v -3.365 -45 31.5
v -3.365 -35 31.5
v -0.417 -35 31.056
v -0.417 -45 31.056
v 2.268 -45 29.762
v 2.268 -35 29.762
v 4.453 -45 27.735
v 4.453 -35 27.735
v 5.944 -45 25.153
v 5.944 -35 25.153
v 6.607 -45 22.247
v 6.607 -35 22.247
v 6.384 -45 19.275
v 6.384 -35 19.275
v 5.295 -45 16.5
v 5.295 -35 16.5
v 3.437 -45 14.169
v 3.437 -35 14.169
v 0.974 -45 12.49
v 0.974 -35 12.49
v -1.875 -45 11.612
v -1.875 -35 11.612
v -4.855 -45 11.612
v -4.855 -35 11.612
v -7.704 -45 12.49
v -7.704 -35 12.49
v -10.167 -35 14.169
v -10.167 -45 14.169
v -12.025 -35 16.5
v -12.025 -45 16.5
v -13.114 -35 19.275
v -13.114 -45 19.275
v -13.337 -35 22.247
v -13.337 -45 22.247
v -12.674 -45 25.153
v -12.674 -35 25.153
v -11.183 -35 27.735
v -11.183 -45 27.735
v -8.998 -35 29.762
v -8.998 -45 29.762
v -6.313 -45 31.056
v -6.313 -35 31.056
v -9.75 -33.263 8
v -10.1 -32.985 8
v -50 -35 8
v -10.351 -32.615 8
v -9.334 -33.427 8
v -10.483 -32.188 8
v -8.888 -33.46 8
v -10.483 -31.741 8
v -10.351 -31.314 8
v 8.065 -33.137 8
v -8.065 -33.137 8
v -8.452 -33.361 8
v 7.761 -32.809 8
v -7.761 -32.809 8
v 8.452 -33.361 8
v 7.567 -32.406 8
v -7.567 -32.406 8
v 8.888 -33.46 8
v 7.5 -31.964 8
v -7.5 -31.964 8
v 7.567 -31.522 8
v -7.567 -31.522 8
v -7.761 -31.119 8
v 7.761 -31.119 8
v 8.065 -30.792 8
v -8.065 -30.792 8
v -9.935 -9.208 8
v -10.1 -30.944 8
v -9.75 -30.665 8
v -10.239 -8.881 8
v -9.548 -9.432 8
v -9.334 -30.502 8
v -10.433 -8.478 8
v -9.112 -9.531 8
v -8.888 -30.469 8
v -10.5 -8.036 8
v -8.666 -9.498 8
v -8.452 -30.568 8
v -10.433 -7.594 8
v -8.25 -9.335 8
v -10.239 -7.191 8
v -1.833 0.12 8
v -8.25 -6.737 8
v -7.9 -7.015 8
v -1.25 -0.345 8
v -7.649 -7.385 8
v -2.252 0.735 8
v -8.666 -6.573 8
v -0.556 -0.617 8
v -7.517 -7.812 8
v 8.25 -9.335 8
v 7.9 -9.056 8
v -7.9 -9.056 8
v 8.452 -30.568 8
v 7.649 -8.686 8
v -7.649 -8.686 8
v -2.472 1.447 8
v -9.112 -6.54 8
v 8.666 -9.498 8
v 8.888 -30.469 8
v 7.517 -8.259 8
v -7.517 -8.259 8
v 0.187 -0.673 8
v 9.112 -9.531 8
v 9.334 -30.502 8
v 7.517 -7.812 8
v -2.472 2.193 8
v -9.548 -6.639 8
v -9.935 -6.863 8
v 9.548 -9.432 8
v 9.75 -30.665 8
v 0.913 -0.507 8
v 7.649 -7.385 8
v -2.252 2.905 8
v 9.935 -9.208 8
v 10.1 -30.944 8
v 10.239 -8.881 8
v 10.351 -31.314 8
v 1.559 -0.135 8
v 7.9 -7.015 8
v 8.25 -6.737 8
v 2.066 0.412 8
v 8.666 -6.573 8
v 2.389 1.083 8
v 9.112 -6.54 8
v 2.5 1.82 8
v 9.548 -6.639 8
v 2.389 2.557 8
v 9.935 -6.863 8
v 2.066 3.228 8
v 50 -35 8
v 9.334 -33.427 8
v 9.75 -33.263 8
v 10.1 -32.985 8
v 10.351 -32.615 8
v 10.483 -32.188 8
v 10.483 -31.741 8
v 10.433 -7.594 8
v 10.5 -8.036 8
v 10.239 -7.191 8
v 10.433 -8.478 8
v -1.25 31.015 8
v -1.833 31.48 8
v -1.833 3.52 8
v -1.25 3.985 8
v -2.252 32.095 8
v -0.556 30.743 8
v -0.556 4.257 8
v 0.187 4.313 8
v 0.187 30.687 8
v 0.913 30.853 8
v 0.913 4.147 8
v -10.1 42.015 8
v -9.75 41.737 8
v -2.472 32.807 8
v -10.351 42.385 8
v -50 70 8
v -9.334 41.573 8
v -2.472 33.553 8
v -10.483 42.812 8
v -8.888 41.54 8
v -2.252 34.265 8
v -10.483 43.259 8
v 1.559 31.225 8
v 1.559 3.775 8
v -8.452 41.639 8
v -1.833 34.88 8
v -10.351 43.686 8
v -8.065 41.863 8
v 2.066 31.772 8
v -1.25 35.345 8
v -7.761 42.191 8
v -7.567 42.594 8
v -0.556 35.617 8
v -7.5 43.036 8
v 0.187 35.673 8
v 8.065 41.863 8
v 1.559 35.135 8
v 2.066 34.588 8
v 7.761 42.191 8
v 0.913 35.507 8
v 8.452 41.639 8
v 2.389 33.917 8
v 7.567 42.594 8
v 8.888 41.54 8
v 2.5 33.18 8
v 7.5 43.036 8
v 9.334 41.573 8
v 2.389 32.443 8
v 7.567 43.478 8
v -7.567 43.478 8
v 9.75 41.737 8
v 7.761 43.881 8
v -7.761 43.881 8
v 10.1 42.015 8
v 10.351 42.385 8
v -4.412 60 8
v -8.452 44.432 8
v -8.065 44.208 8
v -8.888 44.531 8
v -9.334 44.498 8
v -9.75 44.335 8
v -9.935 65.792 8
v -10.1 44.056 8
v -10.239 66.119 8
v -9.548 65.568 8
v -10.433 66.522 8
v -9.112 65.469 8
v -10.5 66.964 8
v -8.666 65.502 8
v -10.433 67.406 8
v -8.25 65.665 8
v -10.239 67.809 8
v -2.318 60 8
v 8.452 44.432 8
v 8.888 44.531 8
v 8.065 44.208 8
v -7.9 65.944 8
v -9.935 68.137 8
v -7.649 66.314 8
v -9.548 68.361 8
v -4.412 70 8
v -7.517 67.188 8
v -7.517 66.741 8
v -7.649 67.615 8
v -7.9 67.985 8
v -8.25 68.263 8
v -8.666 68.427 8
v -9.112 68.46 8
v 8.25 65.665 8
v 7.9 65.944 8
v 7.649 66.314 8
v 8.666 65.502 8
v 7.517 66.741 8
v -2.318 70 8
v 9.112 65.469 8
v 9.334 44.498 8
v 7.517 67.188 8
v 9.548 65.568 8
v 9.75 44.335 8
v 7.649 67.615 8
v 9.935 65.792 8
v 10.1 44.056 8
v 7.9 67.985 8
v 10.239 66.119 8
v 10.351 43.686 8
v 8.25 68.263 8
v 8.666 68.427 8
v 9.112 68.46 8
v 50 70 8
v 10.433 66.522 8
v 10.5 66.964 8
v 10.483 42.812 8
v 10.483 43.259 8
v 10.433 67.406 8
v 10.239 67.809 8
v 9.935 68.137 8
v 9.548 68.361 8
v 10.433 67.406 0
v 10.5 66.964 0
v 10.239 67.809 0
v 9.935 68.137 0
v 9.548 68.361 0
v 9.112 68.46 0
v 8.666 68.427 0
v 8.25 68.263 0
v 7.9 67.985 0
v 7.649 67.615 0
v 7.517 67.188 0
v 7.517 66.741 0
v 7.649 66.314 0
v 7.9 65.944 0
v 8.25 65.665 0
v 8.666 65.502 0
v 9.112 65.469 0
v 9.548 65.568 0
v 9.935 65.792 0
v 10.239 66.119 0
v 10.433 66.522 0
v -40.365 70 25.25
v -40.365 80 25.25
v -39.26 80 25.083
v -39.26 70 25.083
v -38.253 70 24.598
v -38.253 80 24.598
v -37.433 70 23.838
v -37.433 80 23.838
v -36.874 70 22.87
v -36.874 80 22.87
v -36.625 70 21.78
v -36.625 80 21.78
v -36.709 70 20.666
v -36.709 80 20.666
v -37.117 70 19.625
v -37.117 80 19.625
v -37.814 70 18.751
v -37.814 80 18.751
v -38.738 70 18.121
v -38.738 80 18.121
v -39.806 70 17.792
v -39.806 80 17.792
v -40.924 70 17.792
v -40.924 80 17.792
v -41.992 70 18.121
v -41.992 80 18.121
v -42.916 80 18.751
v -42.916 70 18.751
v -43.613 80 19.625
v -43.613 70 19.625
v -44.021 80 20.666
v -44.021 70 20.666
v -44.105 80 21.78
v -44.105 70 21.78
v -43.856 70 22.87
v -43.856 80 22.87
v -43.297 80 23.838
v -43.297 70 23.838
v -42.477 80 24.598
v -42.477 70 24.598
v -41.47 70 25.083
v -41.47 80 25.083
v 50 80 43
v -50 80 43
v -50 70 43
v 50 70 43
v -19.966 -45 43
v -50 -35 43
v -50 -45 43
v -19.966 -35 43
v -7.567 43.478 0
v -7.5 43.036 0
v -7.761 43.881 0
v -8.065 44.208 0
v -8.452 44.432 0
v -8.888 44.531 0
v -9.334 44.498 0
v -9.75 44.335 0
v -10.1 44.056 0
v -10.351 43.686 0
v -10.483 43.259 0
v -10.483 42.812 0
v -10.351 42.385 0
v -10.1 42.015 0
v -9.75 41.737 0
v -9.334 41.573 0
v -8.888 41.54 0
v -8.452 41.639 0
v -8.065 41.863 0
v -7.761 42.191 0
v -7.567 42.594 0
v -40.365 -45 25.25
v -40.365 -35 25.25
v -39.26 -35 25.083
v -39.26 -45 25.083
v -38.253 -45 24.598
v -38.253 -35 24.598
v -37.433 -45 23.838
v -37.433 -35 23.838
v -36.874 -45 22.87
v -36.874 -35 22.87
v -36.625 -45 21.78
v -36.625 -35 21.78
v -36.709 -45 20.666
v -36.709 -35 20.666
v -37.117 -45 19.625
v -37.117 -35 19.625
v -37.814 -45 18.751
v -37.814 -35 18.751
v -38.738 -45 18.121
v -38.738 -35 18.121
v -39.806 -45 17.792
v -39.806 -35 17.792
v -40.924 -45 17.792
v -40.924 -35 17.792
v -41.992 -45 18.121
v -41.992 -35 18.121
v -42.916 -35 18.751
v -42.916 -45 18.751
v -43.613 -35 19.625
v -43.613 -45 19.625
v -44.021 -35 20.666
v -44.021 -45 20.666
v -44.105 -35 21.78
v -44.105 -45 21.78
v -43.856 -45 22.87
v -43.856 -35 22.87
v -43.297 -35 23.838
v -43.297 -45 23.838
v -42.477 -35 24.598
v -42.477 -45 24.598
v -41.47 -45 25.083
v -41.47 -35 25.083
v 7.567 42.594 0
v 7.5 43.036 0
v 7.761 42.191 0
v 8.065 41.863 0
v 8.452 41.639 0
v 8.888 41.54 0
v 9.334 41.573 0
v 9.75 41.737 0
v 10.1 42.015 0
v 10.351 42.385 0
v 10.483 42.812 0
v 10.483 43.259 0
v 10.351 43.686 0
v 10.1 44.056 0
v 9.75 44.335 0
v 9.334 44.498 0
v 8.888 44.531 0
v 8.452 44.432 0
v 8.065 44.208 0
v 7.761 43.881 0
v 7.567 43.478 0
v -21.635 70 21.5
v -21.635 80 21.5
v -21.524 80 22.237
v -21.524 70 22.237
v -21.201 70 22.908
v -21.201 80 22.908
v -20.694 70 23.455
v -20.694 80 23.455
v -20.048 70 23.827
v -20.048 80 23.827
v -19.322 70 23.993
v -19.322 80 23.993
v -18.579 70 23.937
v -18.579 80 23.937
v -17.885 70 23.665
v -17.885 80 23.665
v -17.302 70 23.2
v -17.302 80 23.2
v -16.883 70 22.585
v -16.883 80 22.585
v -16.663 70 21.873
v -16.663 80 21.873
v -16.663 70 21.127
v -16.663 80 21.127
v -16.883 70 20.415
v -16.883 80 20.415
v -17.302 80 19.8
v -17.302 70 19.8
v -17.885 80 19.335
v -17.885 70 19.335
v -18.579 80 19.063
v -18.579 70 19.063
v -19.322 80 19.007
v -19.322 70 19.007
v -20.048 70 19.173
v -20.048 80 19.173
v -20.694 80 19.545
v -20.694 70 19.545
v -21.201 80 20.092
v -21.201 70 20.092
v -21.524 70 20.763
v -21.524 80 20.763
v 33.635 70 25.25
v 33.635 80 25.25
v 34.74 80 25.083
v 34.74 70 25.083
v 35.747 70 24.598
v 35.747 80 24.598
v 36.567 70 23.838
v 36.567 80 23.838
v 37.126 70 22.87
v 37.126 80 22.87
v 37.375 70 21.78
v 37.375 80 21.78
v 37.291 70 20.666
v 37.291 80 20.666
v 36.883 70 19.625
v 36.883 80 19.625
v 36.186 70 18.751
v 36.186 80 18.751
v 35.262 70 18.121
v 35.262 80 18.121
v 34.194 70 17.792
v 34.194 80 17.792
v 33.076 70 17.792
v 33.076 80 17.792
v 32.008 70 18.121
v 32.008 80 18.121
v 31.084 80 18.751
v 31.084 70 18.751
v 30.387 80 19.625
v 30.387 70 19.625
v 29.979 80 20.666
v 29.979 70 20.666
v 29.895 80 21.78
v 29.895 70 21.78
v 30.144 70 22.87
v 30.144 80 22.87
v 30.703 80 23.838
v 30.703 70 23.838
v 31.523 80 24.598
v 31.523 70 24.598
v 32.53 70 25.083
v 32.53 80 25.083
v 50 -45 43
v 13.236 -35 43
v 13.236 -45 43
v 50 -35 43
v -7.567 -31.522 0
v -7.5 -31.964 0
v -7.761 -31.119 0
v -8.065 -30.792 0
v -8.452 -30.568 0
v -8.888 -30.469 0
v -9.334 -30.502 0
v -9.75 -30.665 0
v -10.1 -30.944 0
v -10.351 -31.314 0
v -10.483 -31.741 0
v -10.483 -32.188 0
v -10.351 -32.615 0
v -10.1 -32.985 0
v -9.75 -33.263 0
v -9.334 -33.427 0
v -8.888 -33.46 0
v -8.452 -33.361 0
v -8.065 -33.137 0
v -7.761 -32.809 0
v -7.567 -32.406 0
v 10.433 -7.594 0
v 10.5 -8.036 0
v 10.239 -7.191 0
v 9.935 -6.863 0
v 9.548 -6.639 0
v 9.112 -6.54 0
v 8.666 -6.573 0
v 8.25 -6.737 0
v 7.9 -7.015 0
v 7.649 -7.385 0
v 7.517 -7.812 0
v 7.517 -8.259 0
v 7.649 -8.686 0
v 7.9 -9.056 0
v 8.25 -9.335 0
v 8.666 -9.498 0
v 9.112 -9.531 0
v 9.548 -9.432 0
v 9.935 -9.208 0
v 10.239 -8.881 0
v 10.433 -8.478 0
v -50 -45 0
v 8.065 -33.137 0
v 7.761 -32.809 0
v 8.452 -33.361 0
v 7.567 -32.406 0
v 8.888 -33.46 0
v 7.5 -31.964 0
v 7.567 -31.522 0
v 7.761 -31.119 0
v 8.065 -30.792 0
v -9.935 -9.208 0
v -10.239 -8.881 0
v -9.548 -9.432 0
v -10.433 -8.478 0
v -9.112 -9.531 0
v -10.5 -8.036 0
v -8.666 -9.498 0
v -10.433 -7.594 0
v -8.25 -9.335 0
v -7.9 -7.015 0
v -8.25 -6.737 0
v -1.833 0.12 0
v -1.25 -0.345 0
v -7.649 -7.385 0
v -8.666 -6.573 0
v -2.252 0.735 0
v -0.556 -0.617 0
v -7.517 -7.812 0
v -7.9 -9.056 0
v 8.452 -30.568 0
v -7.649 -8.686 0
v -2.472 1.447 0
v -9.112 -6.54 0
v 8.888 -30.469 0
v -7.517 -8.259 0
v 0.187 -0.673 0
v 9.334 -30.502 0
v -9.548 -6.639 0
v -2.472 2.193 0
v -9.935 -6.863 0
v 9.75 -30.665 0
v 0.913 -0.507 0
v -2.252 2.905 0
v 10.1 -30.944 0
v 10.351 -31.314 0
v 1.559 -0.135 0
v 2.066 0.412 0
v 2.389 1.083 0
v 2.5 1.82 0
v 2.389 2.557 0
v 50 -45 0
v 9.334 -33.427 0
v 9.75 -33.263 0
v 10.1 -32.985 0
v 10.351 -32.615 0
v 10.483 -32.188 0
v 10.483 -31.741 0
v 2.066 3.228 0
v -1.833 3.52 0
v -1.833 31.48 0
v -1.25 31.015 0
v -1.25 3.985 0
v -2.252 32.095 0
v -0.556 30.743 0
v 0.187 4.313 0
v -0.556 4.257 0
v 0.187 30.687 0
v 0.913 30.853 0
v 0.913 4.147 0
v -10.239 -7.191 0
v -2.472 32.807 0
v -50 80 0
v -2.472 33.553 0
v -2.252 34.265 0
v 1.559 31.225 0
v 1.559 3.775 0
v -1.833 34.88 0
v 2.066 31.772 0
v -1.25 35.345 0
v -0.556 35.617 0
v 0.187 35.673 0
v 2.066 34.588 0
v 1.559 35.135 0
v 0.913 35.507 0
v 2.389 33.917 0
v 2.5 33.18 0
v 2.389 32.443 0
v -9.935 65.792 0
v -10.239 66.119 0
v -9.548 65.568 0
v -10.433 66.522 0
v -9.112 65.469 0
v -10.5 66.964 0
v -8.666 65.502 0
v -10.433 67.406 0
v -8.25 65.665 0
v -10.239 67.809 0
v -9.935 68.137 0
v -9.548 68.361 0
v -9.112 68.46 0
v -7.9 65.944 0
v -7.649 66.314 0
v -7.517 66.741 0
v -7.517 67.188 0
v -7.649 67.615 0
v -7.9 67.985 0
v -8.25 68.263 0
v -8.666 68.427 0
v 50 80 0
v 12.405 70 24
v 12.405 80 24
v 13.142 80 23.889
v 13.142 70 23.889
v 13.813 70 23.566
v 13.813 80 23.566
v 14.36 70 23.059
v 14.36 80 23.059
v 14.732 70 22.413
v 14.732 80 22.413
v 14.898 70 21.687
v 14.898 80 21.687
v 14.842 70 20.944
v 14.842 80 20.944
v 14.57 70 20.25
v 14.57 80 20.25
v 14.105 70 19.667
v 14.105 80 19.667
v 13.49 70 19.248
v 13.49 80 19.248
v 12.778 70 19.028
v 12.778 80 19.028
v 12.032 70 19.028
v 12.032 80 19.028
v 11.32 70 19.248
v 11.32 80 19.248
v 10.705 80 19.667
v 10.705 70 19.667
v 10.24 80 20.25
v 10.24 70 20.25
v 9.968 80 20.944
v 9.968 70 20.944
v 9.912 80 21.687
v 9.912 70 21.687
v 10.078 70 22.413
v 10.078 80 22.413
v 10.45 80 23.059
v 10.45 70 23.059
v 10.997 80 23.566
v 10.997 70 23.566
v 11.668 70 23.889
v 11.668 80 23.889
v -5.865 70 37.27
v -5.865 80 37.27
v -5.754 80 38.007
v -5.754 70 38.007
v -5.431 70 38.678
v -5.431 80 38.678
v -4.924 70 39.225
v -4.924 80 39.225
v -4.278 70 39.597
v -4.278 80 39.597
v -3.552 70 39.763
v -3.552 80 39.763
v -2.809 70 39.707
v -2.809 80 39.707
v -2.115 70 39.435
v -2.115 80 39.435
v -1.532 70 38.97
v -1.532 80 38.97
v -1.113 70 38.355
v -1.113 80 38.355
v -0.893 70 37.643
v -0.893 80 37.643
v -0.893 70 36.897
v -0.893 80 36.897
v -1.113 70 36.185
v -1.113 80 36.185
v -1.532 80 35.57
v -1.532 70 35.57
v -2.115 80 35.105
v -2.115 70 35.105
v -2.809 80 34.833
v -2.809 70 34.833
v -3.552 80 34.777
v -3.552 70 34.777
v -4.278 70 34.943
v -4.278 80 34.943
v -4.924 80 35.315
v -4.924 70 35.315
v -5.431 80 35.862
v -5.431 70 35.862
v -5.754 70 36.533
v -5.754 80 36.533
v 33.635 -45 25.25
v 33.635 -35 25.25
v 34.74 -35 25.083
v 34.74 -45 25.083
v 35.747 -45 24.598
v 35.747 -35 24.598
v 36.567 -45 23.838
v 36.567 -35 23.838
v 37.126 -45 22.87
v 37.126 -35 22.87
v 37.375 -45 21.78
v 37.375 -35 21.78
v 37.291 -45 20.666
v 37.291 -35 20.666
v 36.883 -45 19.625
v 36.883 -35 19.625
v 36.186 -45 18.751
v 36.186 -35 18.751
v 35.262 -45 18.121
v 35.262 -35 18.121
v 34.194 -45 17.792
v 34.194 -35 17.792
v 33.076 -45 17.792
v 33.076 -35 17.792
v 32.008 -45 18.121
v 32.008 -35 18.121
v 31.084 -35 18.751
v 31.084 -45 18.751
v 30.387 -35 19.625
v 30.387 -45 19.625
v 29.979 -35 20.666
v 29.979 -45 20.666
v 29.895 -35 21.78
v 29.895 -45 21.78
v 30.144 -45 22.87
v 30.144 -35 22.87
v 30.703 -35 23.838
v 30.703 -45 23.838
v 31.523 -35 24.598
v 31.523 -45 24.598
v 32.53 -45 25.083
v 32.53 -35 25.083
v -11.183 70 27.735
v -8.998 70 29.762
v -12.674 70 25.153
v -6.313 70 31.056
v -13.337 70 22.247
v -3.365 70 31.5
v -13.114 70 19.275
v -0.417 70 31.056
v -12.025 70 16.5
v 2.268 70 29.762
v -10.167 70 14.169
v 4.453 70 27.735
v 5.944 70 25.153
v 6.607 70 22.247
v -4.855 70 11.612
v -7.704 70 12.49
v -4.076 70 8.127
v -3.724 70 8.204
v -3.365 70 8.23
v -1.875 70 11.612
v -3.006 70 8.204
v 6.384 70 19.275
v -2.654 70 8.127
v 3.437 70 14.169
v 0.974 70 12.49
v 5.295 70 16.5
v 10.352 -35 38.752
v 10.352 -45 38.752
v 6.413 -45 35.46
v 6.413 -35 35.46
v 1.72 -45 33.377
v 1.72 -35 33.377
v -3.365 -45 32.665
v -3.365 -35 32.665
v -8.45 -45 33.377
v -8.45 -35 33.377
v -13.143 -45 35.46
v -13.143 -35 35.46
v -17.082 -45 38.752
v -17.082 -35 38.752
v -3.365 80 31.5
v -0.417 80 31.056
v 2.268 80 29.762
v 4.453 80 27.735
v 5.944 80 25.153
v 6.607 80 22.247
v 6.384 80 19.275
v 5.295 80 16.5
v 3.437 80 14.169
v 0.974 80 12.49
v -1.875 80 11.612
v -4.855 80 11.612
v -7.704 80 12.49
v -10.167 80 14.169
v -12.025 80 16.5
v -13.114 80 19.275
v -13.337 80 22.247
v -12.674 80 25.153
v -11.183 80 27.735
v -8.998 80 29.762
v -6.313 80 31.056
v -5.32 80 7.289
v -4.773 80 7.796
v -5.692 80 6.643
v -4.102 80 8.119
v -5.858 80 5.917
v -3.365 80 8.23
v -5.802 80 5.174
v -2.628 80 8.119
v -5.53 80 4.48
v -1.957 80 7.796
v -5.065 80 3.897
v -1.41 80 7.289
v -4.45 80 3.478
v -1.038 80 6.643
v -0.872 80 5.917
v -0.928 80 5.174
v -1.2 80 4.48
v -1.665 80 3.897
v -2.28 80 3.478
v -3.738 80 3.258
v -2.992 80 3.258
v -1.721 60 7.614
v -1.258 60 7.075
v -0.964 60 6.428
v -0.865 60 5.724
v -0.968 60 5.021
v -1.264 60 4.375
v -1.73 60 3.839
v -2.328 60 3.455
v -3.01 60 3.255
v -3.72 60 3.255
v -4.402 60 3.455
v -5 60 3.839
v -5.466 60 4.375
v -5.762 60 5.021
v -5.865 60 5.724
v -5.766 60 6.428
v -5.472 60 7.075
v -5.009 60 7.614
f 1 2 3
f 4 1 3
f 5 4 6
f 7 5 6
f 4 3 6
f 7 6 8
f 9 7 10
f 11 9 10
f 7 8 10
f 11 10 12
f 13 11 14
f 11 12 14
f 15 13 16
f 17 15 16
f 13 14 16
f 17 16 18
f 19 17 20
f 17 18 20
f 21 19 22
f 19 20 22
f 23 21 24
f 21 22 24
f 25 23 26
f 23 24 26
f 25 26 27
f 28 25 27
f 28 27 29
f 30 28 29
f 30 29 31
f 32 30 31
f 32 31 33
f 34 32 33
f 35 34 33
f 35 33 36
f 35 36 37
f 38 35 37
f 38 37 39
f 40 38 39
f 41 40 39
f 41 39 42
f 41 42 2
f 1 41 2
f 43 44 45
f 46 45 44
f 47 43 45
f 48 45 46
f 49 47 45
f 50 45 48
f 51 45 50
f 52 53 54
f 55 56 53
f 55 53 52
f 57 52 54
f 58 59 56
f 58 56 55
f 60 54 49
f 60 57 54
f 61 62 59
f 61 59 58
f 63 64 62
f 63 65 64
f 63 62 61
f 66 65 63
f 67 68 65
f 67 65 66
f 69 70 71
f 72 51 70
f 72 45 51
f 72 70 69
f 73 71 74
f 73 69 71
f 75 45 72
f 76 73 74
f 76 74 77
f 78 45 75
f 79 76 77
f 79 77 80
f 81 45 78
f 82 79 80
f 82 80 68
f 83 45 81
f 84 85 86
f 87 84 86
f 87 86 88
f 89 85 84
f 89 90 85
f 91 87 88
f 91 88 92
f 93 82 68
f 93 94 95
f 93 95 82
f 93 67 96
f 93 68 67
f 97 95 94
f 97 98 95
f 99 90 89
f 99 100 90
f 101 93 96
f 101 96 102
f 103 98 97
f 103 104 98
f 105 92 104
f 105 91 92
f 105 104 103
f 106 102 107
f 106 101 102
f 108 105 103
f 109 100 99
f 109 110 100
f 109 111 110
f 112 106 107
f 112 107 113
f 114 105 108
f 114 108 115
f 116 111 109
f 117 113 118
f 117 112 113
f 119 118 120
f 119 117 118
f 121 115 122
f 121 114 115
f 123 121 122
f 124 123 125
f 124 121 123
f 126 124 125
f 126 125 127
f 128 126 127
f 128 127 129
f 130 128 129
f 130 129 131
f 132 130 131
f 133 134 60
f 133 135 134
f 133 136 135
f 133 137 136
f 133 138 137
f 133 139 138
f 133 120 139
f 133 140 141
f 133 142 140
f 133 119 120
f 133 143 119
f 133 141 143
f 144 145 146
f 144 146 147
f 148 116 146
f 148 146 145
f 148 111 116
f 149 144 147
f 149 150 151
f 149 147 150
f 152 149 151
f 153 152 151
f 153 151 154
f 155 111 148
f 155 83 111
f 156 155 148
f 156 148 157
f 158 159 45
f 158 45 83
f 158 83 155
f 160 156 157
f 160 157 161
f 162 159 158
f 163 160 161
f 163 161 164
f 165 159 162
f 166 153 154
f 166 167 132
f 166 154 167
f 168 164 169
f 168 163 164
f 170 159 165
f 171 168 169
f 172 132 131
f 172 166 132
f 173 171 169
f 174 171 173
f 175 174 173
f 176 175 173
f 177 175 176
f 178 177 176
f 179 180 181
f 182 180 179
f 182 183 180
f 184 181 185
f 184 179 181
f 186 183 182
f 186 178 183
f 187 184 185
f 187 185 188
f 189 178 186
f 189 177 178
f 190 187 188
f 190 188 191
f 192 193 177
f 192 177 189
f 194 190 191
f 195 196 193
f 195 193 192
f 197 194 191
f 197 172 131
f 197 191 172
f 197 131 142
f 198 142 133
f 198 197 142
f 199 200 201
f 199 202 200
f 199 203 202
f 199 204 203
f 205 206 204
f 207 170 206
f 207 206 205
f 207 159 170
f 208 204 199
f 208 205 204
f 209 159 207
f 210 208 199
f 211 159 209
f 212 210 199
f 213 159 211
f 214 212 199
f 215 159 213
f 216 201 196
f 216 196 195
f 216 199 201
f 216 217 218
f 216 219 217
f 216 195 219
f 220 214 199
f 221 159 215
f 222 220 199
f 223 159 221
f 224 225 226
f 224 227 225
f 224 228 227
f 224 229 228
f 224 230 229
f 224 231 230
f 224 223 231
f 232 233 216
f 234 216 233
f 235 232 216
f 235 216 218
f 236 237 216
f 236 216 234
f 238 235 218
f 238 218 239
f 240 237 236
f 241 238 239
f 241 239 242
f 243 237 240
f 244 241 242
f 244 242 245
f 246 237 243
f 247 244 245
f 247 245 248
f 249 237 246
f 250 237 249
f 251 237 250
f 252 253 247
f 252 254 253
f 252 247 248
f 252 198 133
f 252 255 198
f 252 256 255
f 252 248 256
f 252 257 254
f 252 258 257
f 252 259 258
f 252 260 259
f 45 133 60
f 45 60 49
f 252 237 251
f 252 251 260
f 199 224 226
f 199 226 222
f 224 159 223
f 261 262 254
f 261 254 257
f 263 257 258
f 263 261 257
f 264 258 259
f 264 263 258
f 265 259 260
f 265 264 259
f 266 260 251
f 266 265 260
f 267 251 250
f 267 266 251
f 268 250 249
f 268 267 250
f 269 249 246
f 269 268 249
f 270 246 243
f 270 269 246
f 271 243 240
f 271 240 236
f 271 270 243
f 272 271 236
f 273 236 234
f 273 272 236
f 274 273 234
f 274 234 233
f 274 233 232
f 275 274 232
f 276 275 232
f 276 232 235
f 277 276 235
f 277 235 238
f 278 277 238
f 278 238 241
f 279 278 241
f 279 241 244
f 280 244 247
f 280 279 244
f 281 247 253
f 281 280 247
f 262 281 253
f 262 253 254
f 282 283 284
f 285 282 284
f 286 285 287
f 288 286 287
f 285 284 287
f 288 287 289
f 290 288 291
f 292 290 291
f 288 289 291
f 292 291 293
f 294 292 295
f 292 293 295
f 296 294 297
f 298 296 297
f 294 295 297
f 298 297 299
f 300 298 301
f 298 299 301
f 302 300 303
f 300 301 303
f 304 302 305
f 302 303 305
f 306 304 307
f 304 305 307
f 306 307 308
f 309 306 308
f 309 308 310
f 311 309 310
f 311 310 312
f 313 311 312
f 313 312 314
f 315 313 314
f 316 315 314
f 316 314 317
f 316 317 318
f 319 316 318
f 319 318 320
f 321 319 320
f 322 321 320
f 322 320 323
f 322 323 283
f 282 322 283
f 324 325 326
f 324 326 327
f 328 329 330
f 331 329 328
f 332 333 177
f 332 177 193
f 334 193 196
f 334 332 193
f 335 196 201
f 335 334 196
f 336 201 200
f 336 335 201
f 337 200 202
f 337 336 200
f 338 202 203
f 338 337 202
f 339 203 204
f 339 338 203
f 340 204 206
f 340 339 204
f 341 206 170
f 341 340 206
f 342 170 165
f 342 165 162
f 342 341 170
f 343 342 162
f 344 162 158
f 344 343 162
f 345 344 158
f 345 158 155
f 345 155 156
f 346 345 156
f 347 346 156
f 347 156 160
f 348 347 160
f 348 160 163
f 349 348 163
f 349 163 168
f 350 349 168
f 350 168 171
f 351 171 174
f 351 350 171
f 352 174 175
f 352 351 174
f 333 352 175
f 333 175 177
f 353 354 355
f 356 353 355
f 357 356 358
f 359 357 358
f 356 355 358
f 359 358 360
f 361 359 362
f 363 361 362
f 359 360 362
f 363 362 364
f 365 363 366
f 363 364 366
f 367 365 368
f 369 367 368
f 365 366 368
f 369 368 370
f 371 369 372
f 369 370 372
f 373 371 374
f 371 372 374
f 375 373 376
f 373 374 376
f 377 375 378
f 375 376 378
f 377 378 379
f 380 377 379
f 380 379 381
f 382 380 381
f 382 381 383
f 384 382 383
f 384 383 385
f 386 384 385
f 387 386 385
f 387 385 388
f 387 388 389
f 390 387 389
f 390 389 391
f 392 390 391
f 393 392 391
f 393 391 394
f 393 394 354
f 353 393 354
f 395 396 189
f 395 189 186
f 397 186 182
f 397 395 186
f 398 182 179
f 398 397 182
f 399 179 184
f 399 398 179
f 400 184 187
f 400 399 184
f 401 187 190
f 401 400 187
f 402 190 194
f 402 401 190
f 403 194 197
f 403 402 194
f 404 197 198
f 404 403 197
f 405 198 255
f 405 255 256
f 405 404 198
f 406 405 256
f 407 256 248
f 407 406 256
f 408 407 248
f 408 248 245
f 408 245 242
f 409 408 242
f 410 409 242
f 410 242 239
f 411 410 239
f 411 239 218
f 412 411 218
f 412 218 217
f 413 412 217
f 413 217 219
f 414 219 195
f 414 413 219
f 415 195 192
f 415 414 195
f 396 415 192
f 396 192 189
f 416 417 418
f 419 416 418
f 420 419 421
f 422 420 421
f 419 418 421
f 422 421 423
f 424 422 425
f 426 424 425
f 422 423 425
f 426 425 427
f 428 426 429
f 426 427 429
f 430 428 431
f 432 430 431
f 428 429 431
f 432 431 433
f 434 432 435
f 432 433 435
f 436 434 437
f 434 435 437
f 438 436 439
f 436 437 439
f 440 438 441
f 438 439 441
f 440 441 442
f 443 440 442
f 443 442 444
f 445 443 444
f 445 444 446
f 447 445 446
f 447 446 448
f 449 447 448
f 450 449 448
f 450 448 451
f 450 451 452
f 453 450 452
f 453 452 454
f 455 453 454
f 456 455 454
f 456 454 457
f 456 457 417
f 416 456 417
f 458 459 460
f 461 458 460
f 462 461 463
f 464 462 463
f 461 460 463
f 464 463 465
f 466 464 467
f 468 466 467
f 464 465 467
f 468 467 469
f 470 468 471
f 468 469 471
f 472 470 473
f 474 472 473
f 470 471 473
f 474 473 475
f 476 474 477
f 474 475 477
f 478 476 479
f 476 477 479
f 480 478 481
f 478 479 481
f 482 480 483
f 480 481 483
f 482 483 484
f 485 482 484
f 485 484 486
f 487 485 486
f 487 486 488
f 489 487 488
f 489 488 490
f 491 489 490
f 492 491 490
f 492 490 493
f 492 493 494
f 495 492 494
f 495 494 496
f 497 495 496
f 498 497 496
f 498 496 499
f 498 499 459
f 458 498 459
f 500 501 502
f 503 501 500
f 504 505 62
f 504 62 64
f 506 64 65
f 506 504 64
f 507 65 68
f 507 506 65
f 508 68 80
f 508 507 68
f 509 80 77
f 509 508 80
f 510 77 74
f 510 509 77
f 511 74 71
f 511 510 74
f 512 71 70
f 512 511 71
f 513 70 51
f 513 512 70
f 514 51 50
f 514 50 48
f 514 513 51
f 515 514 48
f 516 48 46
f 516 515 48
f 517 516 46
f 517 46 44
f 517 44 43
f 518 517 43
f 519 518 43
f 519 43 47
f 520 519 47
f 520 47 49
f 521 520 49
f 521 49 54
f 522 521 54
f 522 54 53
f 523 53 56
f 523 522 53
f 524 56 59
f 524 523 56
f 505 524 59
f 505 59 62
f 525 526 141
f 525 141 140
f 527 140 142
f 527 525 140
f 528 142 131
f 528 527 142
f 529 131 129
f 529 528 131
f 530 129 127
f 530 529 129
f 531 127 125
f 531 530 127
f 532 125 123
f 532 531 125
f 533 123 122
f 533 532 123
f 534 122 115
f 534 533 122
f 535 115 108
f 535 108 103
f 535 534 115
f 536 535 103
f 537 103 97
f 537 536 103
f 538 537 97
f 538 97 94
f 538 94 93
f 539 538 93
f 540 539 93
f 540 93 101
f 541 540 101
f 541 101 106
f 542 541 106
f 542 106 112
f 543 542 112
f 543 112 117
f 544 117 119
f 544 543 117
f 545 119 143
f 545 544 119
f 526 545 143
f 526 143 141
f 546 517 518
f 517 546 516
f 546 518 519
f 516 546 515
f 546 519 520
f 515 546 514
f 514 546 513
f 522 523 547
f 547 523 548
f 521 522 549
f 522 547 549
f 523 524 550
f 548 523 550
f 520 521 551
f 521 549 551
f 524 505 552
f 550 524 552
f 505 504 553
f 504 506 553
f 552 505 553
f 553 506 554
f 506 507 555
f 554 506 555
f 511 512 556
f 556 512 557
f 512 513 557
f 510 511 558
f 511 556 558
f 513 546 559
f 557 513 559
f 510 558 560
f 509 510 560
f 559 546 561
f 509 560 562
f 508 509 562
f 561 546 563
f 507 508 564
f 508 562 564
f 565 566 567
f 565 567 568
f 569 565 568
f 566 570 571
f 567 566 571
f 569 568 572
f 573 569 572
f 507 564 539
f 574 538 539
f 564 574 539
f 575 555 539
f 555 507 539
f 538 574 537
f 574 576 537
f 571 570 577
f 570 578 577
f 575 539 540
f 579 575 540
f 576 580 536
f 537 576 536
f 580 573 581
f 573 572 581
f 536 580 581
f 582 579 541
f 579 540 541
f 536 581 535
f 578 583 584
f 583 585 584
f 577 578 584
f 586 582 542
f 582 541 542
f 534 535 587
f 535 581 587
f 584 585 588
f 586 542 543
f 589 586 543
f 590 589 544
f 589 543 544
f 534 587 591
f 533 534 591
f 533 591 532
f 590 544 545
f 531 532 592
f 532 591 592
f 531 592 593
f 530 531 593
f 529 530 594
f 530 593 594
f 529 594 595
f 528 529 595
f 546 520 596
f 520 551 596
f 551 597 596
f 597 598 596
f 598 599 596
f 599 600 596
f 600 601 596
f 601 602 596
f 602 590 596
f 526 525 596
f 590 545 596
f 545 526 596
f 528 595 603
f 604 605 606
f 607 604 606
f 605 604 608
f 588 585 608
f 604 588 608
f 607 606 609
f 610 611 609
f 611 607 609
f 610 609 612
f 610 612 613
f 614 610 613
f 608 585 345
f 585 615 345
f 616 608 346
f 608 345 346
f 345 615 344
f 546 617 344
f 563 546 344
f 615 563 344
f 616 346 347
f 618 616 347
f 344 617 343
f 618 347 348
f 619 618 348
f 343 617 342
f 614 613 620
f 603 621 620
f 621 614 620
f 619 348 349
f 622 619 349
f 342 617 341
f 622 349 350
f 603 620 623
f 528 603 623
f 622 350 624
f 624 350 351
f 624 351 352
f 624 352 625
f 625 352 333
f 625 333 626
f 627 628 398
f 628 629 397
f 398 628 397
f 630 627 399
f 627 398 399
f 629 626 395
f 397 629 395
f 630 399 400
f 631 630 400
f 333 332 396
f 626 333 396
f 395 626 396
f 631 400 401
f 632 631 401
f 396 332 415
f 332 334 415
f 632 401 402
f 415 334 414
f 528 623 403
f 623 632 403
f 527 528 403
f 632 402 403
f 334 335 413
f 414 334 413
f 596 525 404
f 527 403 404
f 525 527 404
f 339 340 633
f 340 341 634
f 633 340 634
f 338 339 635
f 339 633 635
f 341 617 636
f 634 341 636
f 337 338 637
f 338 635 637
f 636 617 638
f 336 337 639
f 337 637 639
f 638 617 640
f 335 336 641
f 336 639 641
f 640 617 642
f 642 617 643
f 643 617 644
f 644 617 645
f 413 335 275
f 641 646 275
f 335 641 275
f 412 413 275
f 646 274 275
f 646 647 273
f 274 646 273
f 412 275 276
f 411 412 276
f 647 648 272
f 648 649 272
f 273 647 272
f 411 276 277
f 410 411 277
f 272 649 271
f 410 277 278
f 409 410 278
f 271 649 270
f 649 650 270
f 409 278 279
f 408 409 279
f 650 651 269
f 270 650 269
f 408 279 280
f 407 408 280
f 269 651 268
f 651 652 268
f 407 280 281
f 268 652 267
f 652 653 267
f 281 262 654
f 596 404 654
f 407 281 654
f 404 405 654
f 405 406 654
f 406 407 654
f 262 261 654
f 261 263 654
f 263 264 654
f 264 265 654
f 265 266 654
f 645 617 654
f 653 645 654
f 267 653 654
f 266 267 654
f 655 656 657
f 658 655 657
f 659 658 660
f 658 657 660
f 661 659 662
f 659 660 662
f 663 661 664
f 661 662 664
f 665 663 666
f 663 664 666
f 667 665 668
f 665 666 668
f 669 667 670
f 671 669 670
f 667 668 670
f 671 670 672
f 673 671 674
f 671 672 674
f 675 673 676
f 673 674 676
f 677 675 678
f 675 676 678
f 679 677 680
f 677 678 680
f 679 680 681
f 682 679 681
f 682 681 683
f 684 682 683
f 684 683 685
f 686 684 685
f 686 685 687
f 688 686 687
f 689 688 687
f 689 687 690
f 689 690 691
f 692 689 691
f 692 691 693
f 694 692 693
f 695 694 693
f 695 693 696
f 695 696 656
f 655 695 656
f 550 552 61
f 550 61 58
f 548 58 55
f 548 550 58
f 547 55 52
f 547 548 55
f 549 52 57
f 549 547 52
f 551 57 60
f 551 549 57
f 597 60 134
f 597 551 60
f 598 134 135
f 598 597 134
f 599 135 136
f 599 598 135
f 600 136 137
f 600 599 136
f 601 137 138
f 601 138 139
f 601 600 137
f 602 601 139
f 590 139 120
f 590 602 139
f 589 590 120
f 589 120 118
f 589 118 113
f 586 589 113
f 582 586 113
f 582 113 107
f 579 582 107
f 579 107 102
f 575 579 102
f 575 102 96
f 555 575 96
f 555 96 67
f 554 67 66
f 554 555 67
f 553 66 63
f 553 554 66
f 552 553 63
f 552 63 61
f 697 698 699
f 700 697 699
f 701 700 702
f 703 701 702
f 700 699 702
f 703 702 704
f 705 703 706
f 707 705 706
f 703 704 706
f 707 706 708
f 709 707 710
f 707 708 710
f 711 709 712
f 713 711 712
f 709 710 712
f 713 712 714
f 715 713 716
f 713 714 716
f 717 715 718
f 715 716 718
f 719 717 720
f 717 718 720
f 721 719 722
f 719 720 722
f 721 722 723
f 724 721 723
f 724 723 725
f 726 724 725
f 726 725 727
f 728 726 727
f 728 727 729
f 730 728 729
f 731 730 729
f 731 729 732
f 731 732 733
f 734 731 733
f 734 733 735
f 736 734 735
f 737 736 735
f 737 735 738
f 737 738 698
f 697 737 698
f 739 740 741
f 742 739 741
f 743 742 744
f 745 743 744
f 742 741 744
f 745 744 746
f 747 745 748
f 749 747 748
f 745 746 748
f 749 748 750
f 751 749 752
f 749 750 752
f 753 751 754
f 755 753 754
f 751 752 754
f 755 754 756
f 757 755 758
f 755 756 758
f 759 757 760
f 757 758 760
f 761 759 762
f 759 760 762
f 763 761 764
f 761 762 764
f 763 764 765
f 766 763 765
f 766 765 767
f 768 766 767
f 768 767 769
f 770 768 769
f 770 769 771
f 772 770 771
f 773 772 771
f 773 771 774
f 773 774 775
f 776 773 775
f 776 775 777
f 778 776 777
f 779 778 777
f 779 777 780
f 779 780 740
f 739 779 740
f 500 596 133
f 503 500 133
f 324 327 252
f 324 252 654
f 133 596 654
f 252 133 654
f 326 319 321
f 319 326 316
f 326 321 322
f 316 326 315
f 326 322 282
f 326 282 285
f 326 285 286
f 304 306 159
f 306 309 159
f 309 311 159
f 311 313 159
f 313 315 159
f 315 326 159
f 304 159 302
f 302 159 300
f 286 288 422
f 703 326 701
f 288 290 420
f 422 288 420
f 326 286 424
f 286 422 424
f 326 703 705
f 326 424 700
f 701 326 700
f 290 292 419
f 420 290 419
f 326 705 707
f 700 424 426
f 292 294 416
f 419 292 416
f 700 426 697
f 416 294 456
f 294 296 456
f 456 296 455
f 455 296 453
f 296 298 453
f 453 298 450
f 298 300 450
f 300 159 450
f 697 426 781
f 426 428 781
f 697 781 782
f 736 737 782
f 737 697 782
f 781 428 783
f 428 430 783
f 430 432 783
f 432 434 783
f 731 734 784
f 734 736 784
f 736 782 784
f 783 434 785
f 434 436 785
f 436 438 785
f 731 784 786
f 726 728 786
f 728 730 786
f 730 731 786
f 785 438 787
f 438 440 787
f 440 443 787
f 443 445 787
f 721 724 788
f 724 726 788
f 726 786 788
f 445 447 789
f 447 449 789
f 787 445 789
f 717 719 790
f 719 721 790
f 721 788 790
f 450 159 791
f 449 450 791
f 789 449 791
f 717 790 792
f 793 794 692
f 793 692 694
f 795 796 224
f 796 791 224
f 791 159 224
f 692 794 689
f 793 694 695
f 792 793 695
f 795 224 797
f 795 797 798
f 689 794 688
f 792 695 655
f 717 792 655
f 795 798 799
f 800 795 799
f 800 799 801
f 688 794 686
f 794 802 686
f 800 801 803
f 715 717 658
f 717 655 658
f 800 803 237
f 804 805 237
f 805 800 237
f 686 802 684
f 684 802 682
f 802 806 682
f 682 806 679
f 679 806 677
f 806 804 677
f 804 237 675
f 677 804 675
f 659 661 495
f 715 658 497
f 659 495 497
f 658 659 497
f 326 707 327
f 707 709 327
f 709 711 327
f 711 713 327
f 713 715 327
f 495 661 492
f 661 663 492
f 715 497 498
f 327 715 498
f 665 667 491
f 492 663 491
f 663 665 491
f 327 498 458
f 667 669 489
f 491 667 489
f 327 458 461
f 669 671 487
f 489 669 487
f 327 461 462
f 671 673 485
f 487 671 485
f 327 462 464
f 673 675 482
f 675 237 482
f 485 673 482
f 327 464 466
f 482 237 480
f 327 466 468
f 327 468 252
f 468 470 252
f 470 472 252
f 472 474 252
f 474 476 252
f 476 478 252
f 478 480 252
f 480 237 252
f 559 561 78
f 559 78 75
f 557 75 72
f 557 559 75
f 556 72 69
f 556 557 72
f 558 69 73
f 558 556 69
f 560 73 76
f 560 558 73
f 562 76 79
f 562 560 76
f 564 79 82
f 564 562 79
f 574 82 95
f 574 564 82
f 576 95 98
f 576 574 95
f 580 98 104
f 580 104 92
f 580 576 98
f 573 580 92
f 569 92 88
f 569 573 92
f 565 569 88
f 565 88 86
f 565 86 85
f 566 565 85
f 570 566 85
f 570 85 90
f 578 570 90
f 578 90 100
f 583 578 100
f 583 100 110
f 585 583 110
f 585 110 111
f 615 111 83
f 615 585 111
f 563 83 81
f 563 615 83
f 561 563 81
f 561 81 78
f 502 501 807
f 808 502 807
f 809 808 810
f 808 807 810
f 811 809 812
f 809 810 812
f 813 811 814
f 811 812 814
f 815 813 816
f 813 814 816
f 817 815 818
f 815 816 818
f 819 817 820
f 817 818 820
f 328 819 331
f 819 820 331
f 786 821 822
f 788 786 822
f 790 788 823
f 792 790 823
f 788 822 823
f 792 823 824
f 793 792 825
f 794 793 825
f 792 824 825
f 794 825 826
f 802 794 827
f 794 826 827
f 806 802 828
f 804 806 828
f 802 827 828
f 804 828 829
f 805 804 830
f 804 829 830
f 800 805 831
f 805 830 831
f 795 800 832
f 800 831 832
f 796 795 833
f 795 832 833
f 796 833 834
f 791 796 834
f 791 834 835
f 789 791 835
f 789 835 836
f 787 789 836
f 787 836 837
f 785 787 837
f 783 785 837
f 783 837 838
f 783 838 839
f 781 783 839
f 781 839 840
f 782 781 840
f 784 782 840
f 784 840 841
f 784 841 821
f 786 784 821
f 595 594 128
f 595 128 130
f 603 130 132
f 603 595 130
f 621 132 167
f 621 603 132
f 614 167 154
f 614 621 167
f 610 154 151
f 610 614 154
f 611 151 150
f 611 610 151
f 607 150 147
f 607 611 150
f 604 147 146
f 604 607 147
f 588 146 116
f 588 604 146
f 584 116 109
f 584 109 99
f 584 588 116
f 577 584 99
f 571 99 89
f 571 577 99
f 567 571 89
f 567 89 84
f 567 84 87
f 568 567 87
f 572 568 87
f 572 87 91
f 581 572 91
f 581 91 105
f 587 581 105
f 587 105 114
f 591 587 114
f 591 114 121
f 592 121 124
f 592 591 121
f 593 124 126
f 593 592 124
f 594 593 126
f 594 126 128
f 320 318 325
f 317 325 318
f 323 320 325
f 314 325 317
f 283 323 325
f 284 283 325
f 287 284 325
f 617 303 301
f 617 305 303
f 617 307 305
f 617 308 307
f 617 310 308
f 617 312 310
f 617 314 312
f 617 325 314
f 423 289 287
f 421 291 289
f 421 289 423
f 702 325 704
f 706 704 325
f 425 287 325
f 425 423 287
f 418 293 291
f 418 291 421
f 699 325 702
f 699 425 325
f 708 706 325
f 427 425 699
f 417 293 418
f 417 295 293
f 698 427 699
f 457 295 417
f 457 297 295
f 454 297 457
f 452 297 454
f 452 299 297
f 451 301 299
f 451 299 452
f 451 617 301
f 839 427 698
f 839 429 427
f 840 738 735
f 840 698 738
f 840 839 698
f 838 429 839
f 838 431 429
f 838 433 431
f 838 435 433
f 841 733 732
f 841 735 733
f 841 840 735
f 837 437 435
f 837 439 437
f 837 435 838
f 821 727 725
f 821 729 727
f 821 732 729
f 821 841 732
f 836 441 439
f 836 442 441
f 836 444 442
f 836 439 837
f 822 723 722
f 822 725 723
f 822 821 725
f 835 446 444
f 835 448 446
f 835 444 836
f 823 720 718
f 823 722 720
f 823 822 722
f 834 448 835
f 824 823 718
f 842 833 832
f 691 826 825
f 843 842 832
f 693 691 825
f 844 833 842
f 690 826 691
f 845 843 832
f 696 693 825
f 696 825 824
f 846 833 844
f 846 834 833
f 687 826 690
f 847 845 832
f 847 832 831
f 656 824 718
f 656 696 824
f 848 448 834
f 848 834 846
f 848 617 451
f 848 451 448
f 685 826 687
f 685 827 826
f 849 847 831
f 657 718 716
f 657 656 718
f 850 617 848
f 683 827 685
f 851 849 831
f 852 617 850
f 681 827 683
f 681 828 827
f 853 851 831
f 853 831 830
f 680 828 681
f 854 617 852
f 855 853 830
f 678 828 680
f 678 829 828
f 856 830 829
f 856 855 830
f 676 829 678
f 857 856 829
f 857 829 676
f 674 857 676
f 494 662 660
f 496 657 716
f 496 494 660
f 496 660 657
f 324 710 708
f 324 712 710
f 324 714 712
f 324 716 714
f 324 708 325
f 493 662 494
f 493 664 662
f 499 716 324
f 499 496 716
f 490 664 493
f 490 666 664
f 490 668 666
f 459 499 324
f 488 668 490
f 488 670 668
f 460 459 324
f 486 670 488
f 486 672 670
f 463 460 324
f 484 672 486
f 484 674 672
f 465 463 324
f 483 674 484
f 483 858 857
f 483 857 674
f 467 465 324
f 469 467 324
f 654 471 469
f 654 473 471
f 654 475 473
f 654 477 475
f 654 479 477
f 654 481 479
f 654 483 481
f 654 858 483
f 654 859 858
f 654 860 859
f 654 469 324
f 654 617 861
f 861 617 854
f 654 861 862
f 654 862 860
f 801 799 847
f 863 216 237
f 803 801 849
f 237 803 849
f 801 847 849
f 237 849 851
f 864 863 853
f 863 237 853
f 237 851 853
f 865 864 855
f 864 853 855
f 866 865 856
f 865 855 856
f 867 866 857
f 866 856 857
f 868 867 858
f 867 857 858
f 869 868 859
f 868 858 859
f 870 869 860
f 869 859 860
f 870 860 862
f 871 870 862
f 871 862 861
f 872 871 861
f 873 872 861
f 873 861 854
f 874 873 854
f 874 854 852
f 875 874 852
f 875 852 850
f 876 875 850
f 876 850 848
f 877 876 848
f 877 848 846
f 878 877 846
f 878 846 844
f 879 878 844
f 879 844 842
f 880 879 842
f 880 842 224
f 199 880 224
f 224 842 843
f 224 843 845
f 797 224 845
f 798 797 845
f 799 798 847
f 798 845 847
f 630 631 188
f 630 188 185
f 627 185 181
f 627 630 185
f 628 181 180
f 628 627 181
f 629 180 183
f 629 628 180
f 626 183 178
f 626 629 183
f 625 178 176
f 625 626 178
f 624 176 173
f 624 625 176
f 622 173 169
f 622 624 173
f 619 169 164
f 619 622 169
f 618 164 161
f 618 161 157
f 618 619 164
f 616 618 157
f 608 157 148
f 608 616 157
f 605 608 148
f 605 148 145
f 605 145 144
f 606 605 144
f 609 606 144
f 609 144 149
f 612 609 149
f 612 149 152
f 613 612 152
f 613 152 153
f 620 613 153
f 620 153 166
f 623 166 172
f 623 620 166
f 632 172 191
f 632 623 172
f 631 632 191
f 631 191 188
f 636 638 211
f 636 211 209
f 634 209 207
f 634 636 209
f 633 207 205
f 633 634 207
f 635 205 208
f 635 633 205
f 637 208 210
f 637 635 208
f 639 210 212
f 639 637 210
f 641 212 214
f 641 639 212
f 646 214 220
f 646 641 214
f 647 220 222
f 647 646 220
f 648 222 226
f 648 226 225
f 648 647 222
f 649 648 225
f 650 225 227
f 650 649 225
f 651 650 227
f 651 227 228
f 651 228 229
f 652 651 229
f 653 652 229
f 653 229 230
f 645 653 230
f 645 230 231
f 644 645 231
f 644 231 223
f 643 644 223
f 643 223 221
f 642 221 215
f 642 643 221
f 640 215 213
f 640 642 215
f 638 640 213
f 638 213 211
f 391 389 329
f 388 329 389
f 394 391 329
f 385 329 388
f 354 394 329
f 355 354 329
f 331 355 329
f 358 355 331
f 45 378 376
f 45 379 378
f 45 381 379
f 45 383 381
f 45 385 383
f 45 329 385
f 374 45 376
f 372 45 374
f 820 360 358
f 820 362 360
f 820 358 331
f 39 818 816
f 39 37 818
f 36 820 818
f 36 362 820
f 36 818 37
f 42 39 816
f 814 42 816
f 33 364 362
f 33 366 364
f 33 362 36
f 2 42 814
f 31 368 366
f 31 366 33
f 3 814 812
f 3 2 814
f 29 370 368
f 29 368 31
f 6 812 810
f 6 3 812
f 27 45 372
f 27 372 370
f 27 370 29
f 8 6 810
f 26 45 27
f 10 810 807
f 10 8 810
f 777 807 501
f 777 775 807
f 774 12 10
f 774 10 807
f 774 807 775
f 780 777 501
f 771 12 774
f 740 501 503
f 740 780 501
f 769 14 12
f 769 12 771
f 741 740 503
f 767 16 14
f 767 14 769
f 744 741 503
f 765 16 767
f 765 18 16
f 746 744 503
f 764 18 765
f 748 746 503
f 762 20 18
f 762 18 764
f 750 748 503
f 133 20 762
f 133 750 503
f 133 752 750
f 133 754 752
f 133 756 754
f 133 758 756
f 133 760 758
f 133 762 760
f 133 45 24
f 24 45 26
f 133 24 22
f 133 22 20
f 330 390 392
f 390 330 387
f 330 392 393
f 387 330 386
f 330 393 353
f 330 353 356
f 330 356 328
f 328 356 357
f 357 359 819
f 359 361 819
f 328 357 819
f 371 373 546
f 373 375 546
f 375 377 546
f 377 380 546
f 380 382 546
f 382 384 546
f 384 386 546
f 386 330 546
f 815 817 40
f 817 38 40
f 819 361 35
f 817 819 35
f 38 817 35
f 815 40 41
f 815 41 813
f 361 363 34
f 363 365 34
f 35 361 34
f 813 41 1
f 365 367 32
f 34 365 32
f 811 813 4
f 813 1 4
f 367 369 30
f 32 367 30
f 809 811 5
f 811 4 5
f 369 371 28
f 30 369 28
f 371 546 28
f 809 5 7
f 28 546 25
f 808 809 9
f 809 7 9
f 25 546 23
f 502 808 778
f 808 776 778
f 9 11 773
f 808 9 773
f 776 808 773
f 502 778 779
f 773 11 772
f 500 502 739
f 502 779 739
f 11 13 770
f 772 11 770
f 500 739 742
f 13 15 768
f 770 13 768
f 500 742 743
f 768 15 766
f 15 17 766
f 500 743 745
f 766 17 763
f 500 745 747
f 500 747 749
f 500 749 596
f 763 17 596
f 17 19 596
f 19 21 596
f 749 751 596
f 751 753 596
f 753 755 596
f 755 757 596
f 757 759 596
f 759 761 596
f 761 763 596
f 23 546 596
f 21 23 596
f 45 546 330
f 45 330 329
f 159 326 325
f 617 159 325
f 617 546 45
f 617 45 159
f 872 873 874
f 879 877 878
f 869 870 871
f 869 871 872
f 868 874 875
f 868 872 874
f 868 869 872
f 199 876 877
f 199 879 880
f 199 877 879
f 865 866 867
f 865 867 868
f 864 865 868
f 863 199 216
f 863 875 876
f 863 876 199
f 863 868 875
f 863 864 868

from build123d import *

# Parameters (mm, degrees)
SKETCH2_W           = 100
SKETCH2_H           = 125
SKETCH2_R           = 1.5
SKETCH2_R_2         = 2.5
BOSS_EXTRUDE1_DEPTH = 8
SKETCH5_W           = 100
SKETCH5_H           = 10
BOSS_EXTRUDE2_DEPTH = 35
SKETCH7_R           = 10
SKETCH7_R_2         = 3.75
CUT_EXTRUDE2_DEPTH  = 290
SKETCH8_R           = 18.5
CUT_EXTRUDE5_DEPTH  = 133.566964211
SKETCH9_R           = 2.5
CUT_EXTRUDE6_DEPTH  = 20


with BuildPart() as part:
    # Sketch2 → Boss-Extrude1 (new body)
    with BuildSketch(Plane.XY):
        with Locations((0, 17.5)):
            Rectangle(SKETCH2_W, SKETCH2_H)
        with Locations(Location((-9, -8.03563588, 0), (0, 0, 180))):
            Circle(SKETCH2_R, mode=Mode.SUBTRACT)
        with Locations(Location((9, -31.96436412, 0), (0, 0, 180))):
            Circle(SKETCH2_R, mode=Mode.SUBTRACT)
        with Locations((9, -8.03563588)):
            Circle(SKETCH2_R, mode=Mode.SUBTRACT)
        with Locations((-9, -31.96436412)):
            Circle(SKETCH2_R, mode=Mode.SUBTRACT)
        with Locations(Location((9, 43.03563588, 0), (0, 0, 180))):
            Circle(SKETCH2_R, mode=Mode.SUBTRACT)
        with Locations((-9, 43.03563588)):
            Circle(SKETCH2_R, mode=Mode.SUBTRACT)
        with Locations(Location((-9, 66.96436412, 0), (0, 0, 180))):
            Circle(SKETCH2_R, mode=Mode.SUBTRACT)
        with Locations((9, 66.96436412)):
            Circle(SKETCH2_R, mode=Mode.SUBTRACT)
        with Locations((0, 33.18)):
            Circle(SKETCH2_R_2, mode=Mode.SUBTRACT)
        with Locations((0, 1.82)):
            Circle(SKETCH2_R_2, mode=Mode.SUBTRACT)
    extrude(amount=BOSS_EXTRUDE1_DEPTH)

    # Sketch5 → Boss-Extrude2 (add)
    with BuildSketch(Plane.XY.offset(8)):
        with Locations((0, 75)):
            Rectangle(SKETCH5_W, SKETCH5_H)
        with Locations((0, -40)):
            Rectangle(SKETCH5_W, SKETCH5_H)
    extrude(amount=BOSS_EXTRUDE2_DEPTH)

    # Sketch7 → Cut-Extrude2 (cut)
    with BuildSketch(Plane(origin=(0, 80, 0), x_dir=(1, 0, 0), z_dir=(0, 1, 0))):
        with Locations(Location((-3.365, -21.5, 0), (0, 0, 270))):
            Circle(SKETCH7_R)
        with Locations(Location((-40.365, -21.5, 0), (0, 0, 270))):
            Circle(SKETCH7_R_2)
        with Locations(Location((33.635, -21.5, 0), (0, 0, 270))):
            Circle(SKETCH7_R_2)
    extrude(amount=-CUT_EXTRUDE2_DEPTH, mode=Mode.SUBTRACT)

    # Sketch8 → Cut-Extrude5 (cut, through all)
    with BuildSketch(Plane(origin=(0, -35, 0), x_dir=(1, 0, 0), z_dir=(0, 1, 0))):
        with Locations((-3.365, -51.164787316)):
            Circle(SKETCH8_R)
    extrude(amount=-CUT_EXTRUDE5_DEPTH, mode=Mode.SUBTRACT)

    # Sketch9 → Cut-Extrude6 (cut)
    with BuildSketch(Plane(origin=(0, 80, 0), x_dir=(1, 0, 0), z_dir=(0, 1, 0))):
        with Locations(Location((-3.365, -5.73, 0), (0, 0, 270))):
            Circle(SKETCH9_R)
        with Locations(Location((12.405, -21.5, 0), (0, 0, 270))):
            Circle(SKETCH9_R)
        with Locations(Location((-19.135, -21.5, 0), (0, 0, 180))):
            Circle(SKETCH9_R)
        with Locations(Location((-3.365, -37.27, 0), (0, 0, 180))):
            Circle(SKETCH9_R)
    extrude(amount=-CUT_EXTRUDE6_DEPTH, mode=Mode.SUBTRACT)


solid = part.part
